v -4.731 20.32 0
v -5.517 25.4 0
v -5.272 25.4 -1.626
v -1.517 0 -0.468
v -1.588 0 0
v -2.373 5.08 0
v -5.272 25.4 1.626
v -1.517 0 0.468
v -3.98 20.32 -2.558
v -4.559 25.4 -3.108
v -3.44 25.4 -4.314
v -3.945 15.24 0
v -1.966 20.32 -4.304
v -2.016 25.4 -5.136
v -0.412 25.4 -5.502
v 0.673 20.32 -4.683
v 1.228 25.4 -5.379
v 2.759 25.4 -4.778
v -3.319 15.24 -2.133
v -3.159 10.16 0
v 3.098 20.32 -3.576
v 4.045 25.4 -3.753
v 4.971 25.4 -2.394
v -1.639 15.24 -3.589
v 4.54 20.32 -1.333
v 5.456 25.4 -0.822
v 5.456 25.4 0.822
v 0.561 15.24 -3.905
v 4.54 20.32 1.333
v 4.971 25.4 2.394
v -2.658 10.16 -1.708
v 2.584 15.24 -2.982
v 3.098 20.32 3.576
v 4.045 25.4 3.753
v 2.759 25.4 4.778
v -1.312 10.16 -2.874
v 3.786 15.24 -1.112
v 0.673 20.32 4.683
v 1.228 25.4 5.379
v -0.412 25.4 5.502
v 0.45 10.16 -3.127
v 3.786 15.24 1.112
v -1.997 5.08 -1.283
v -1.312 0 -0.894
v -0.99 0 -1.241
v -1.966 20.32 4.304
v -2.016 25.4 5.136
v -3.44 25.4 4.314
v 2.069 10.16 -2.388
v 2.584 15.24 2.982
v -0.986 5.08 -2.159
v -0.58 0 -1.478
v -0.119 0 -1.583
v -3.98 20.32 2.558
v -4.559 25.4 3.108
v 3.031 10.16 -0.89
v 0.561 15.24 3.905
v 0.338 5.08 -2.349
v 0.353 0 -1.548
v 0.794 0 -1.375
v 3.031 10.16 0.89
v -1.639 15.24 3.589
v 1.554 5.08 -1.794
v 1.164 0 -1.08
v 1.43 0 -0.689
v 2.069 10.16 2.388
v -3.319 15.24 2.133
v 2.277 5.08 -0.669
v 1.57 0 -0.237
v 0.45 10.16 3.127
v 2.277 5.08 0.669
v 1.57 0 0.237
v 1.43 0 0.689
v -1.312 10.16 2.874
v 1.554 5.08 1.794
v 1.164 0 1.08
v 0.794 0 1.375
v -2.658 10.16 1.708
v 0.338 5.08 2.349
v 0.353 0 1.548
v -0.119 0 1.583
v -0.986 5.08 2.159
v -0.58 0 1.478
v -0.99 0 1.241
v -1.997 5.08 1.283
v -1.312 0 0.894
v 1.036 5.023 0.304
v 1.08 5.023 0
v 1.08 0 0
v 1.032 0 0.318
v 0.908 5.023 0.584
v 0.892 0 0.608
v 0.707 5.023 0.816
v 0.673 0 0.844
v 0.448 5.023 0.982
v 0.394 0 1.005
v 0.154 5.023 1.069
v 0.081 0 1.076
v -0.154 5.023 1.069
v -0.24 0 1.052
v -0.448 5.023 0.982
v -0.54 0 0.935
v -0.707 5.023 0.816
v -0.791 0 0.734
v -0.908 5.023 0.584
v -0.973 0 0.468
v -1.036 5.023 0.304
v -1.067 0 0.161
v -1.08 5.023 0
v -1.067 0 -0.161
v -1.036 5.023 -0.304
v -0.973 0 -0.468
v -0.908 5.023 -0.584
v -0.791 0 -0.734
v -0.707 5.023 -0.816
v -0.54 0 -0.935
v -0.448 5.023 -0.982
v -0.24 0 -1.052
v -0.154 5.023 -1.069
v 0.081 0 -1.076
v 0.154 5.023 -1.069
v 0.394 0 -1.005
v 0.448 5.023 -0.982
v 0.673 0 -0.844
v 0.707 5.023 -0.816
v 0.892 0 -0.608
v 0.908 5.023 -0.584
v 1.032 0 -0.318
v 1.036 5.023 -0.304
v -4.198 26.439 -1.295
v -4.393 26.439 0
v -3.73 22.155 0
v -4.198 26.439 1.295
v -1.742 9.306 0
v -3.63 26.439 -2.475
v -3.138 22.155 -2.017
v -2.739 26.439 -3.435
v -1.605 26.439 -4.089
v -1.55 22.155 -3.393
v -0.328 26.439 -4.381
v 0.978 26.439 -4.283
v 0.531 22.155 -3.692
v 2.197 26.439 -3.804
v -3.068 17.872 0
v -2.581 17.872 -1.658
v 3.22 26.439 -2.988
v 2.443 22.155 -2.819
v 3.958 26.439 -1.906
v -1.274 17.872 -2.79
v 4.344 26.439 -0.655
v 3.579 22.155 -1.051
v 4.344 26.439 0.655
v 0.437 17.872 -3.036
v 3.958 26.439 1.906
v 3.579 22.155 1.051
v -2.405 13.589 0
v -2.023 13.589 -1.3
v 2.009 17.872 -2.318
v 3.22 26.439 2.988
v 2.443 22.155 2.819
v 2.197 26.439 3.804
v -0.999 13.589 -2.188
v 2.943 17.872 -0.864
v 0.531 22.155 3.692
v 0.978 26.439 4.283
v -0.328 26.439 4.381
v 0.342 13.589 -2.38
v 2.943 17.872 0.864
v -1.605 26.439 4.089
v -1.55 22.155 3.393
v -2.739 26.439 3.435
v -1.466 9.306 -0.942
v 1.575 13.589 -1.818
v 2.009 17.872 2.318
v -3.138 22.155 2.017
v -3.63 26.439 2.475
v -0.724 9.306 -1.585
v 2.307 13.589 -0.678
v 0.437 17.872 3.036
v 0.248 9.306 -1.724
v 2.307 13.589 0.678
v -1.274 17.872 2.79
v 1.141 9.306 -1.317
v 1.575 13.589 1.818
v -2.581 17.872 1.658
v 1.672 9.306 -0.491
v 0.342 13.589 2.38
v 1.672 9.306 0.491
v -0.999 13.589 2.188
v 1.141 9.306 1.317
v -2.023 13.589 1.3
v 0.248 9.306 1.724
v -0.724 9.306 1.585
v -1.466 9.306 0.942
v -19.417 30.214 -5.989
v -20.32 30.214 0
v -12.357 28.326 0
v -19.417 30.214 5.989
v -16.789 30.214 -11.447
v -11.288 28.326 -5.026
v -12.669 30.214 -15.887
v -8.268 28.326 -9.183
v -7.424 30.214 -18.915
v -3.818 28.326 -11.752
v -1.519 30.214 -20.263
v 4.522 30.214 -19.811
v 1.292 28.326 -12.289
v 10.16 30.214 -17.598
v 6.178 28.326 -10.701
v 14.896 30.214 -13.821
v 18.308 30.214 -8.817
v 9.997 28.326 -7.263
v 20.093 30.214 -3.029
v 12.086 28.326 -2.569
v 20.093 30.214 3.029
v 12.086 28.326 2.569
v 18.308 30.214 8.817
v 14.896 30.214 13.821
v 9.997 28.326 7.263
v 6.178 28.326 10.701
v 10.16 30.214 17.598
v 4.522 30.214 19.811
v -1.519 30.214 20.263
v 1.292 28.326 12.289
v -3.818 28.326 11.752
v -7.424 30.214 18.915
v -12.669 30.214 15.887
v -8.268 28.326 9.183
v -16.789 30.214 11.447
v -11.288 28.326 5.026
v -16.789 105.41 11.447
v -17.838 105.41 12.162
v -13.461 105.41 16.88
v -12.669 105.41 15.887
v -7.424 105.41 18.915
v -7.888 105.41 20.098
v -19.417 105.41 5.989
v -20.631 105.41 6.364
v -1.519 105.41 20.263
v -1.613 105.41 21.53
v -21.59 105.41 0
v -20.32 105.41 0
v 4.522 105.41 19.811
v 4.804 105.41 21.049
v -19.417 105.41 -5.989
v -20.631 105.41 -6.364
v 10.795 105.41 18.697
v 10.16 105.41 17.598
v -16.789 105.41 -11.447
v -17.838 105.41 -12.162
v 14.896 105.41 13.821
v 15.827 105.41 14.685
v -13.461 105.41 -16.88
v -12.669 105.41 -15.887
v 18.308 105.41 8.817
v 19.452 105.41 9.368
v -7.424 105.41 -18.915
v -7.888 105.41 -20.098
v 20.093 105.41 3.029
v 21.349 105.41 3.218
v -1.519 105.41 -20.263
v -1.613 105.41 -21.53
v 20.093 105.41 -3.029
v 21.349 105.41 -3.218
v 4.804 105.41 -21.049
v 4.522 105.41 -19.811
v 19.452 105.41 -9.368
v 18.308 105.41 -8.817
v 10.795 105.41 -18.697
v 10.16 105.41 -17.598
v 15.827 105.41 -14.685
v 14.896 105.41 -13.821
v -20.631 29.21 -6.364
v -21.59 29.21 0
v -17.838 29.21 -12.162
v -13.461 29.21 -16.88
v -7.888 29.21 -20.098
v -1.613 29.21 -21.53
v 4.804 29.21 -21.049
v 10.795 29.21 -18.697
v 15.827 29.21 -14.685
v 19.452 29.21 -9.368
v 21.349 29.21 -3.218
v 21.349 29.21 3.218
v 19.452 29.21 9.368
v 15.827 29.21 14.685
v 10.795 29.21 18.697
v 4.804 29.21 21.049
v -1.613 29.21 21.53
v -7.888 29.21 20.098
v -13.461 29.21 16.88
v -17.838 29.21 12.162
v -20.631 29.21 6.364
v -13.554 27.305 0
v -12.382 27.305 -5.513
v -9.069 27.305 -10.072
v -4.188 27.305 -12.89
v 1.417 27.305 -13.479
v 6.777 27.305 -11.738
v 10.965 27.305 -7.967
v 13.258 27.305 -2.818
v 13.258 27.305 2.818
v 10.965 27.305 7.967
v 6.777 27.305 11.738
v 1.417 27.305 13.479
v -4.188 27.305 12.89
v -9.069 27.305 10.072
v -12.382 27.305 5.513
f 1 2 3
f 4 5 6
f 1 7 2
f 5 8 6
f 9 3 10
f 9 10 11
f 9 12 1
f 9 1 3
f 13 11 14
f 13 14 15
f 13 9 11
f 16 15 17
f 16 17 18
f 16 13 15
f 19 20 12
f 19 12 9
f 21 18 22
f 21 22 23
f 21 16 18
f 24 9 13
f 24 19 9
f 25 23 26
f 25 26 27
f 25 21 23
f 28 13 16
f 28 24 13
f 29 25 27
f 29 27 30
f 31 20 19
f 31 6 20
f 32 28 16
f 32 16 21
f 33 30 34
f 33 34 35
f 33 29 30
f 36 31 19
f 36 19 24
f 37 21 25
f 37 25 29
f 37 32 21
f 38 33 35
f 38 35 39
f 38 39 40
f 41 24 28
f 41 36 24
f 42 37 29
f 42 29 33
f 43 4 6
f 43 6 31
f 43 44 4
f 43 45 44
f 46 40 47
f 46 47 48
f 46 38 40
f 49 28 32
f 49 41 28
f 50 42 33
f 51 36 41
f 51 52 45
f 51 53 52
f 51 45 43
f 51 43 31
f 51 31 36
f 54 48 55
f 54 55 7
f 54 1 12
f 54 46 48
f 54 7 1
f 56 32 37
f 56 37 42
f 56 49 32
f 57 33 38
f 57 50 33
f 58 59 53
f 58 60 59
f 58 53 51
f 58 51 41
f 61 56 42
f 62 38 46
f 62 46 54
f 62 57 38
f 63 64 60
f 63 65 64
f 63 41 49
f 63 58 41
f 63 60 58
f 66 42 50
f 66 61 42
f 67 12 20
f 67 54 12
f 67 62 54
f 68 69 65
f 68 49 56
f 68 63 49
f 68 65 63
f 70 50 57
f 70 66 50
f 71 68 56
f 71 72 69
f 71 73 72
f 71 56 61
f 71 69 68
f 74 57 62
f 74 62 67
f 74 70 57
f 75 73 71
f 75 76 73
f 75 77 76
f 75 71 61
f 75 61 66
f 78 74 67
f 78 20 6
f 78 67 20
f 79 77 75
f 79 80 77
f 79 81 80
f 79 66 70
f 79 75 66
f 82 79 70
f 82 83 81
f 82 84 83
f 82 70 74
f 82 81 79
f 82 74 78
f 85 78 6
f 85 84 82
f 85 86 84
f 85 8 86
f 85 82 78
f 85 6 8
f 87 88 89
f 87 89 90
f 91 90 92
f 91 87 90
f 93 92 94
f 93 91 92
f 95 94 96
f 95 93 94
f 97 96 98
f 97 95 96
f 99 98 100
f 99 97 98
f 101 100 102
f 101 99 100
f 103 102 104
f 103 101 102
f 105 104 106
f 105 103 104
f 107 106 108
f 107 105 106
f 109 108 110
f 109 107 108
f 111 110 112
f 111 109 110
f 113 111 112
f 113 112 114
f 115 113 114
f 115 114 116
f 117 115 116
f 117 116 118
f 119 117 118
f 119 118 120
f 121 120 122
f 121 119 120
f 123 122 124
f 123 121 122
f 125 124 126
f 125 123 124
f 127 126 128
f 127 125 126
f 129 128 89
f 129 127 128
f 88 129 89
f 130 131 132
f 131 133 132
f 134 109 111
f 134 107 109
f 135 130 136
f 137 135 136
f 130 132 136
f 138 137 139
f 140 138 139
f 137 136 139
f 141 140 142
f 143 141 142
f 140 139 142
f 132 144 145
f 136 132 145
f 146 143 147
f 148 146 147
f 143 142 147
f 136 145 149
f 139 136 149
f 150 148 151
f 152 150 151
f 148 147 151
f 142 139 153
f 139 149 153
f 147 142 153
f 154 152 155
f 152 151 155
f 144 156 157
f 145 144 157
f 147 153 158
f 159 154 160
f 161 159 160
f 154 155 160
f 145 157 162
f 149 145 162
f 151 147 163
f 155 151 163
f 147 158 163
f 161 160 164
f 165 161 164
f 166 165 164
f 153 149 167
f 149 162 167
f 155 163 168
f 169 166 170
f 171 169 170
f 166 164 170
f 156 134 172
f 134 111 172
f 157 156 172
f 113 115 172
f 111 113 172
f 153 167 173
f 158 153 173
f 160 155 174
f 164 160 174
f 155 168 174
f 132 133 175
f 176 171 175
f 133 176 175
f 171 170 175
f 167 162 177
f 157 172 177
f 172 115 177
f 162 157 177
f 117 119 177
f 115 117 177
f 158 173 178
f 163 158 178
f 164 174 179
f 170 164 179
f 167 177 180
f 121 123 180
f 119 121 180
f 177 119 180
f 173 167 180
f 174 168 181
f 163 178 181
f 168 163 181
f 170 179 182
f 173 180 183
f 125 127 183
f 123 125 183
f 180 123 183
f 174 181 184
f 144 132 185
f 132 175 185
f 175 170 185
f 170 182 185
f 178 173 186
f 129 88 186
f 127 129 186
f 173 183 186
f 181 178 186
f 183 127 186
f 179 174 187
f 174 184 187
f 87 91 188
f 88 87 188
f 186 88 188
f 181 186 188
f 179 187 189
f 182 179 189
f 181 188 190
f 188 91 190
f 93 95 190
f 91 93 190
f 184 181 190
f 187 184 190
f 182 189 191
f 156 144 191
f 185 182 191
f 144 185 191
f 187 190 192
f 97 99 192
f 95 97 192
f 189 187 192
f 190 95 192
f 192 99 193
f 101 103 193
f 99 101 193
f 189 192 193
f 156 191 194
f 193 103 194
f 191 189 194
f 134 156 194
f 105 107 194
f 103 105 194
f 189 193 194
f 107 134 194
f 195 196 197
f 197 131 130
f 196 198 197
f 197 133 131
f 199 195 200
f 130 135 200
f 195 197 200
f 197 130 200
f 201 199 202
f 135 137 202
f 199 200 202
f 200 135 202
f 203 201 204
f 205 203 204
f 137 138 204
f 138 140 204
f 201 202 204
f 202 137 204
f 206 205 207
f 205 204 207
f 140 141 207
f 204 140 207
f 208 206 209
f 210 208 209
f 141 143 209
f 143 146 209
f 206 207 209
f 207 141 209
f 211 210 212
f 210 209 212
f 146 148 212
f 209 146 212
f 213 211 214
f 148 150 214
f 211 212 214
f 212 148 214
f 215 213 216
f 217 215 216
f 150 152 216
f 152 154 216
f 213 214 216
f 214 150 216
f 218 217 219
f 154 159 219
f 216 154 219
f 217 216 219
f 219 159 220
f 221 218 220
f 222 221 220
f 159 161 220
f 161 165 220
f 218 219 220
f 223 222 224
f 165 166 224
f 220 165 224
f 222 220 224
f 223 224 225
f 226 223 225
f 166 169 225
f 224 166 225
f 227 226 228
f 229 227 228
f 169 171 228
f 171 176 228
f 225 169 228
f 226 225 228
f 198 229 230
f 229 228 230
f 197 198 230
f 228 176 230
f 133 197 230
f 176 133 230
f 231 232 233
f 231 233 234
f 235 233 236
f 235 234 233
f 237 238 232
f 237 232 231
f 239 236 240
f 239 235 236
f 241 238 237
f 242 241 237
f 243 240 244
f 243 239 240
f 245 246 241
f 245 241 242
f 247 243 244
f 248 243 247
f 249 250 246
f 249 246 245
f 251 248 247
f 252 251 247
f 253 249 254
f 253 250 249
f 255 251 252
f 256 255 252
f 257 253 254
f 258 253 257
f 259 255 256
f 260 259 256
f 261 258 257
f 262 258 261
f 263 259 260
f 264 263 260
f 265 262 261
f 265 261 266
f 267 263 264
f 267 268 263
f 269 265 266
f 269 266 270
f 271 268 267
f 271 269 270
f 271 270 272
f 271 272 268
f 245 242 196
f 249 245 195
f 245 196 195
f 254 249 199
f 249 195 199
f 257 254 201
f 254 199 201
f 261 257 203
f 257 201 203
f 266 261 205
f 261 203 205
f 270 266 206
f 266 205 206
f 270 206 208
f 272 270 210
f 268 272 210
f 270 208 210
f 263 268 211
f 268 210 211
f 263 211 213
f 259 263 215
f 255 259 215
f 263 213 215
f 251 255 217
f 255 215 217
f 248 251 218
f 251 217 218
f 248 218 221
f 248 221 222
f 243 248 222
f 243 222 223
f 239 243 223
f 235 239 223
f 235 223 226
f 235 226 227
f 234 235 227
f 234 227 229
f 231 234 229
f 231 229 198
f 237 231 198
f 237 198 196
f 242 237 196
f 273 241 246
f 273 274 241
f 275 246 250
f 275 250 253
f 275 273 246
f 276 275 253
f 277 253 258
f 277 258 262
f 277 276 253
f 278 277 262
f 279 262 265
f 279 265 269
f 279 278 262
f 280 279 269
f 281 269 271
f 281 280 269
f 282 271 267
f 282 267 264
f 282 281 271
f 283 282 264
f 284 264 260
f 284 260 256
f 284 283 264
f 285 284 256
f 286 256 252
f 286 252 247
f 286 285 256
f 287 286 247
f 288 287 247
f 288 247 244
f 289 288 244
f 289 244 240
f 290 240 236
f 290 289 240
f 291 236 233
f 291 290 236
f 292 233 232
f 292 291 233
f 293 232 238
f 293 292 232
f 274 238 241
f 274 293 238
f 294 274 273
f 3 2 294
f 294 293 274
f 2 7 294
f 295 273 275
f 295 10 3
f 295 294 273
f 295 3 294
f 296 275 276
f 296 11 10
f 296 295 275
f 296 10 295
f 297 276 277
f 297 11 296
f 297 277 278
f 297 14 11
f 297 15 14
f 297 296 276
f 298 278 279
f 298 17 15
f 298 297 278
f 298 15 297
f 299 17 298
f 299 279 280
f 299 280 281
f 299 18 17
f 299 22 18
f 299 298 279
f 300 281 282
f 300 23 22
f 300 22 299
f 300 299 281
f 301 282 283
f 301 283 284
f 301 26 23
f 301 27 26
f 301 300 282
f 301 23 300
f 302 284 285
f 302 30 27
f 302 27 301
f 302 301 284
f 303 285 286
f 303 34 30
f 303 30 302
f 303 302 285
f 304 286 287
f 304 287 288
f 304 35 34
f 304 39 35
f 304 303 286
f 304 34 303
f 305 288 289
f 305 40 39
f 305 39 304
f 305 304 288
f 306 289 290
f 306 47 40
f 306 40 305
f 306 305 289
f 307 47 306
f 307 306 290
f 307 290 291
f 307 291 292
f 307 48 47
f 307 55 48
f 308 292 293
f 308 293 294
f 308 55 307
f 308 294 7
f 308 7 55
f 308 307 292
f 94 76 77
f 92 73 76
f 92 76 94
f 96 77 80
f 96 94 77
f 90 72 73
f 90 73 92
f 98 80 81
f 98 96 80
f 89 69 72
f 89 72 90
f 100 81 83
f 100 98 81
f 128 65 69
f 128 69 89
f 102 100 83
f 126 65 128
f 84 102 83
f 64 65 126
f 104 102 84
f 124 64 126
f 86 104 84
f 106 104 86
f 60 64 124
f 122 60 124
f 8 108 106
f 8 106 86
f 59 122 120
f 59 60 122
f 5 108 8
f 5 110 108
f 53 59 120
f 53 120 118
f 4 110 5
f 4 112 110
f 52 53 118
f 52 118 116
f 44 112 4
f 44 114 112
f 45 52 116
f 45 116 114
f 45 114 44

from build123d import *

# Parameters (mm, degrees)
SHELL1_T                = -1.27
CUT_EXTRUDE1_DEPTH      = 110.742992031
CUT_EXTRUDE1_DEPTH_BACK = 110.742992031
SKETCH3_R               = 1.0795


with BuildPart() as part:
    # Sketch1 → Revolve1 (revolve)
    with BuildSketch(Plane.XY):
        Polygon((-5.517444444, 25.4), (-1.5875, 0), (0, 0), (0, 105.41), (-21.59, 105.41), (-21.59, 29.21), align=None)
    revolve(axis=Axis((0, 105.41, 0), (0, -1, 0)))

    # Shell1
    shell1_openings = [part.faces().sort_by_distance(p)[0] for p in [
        (0, 105.41, 0),
    ]]
    offset(amount=SHELL1_T, openings=shell1_openings, kind=Kind.INTERSECTION)

    # Sketch3 → Cut-Extrude1 (cut, two sides: drawn at the far end of the back side and taken through both)
    with BuildSketch(Plane.XZ.offset(-CUT_EXTRUDE1_DEPTH_BACK)):
        Circle(SKETCH3_R)
    extrude(amount=CUT_EXTRUDE1_DEPTH + CUT_EXTRUDE1_DEPTH_BACK, mode=Mode.SUBTRACT)


solid = part.part
